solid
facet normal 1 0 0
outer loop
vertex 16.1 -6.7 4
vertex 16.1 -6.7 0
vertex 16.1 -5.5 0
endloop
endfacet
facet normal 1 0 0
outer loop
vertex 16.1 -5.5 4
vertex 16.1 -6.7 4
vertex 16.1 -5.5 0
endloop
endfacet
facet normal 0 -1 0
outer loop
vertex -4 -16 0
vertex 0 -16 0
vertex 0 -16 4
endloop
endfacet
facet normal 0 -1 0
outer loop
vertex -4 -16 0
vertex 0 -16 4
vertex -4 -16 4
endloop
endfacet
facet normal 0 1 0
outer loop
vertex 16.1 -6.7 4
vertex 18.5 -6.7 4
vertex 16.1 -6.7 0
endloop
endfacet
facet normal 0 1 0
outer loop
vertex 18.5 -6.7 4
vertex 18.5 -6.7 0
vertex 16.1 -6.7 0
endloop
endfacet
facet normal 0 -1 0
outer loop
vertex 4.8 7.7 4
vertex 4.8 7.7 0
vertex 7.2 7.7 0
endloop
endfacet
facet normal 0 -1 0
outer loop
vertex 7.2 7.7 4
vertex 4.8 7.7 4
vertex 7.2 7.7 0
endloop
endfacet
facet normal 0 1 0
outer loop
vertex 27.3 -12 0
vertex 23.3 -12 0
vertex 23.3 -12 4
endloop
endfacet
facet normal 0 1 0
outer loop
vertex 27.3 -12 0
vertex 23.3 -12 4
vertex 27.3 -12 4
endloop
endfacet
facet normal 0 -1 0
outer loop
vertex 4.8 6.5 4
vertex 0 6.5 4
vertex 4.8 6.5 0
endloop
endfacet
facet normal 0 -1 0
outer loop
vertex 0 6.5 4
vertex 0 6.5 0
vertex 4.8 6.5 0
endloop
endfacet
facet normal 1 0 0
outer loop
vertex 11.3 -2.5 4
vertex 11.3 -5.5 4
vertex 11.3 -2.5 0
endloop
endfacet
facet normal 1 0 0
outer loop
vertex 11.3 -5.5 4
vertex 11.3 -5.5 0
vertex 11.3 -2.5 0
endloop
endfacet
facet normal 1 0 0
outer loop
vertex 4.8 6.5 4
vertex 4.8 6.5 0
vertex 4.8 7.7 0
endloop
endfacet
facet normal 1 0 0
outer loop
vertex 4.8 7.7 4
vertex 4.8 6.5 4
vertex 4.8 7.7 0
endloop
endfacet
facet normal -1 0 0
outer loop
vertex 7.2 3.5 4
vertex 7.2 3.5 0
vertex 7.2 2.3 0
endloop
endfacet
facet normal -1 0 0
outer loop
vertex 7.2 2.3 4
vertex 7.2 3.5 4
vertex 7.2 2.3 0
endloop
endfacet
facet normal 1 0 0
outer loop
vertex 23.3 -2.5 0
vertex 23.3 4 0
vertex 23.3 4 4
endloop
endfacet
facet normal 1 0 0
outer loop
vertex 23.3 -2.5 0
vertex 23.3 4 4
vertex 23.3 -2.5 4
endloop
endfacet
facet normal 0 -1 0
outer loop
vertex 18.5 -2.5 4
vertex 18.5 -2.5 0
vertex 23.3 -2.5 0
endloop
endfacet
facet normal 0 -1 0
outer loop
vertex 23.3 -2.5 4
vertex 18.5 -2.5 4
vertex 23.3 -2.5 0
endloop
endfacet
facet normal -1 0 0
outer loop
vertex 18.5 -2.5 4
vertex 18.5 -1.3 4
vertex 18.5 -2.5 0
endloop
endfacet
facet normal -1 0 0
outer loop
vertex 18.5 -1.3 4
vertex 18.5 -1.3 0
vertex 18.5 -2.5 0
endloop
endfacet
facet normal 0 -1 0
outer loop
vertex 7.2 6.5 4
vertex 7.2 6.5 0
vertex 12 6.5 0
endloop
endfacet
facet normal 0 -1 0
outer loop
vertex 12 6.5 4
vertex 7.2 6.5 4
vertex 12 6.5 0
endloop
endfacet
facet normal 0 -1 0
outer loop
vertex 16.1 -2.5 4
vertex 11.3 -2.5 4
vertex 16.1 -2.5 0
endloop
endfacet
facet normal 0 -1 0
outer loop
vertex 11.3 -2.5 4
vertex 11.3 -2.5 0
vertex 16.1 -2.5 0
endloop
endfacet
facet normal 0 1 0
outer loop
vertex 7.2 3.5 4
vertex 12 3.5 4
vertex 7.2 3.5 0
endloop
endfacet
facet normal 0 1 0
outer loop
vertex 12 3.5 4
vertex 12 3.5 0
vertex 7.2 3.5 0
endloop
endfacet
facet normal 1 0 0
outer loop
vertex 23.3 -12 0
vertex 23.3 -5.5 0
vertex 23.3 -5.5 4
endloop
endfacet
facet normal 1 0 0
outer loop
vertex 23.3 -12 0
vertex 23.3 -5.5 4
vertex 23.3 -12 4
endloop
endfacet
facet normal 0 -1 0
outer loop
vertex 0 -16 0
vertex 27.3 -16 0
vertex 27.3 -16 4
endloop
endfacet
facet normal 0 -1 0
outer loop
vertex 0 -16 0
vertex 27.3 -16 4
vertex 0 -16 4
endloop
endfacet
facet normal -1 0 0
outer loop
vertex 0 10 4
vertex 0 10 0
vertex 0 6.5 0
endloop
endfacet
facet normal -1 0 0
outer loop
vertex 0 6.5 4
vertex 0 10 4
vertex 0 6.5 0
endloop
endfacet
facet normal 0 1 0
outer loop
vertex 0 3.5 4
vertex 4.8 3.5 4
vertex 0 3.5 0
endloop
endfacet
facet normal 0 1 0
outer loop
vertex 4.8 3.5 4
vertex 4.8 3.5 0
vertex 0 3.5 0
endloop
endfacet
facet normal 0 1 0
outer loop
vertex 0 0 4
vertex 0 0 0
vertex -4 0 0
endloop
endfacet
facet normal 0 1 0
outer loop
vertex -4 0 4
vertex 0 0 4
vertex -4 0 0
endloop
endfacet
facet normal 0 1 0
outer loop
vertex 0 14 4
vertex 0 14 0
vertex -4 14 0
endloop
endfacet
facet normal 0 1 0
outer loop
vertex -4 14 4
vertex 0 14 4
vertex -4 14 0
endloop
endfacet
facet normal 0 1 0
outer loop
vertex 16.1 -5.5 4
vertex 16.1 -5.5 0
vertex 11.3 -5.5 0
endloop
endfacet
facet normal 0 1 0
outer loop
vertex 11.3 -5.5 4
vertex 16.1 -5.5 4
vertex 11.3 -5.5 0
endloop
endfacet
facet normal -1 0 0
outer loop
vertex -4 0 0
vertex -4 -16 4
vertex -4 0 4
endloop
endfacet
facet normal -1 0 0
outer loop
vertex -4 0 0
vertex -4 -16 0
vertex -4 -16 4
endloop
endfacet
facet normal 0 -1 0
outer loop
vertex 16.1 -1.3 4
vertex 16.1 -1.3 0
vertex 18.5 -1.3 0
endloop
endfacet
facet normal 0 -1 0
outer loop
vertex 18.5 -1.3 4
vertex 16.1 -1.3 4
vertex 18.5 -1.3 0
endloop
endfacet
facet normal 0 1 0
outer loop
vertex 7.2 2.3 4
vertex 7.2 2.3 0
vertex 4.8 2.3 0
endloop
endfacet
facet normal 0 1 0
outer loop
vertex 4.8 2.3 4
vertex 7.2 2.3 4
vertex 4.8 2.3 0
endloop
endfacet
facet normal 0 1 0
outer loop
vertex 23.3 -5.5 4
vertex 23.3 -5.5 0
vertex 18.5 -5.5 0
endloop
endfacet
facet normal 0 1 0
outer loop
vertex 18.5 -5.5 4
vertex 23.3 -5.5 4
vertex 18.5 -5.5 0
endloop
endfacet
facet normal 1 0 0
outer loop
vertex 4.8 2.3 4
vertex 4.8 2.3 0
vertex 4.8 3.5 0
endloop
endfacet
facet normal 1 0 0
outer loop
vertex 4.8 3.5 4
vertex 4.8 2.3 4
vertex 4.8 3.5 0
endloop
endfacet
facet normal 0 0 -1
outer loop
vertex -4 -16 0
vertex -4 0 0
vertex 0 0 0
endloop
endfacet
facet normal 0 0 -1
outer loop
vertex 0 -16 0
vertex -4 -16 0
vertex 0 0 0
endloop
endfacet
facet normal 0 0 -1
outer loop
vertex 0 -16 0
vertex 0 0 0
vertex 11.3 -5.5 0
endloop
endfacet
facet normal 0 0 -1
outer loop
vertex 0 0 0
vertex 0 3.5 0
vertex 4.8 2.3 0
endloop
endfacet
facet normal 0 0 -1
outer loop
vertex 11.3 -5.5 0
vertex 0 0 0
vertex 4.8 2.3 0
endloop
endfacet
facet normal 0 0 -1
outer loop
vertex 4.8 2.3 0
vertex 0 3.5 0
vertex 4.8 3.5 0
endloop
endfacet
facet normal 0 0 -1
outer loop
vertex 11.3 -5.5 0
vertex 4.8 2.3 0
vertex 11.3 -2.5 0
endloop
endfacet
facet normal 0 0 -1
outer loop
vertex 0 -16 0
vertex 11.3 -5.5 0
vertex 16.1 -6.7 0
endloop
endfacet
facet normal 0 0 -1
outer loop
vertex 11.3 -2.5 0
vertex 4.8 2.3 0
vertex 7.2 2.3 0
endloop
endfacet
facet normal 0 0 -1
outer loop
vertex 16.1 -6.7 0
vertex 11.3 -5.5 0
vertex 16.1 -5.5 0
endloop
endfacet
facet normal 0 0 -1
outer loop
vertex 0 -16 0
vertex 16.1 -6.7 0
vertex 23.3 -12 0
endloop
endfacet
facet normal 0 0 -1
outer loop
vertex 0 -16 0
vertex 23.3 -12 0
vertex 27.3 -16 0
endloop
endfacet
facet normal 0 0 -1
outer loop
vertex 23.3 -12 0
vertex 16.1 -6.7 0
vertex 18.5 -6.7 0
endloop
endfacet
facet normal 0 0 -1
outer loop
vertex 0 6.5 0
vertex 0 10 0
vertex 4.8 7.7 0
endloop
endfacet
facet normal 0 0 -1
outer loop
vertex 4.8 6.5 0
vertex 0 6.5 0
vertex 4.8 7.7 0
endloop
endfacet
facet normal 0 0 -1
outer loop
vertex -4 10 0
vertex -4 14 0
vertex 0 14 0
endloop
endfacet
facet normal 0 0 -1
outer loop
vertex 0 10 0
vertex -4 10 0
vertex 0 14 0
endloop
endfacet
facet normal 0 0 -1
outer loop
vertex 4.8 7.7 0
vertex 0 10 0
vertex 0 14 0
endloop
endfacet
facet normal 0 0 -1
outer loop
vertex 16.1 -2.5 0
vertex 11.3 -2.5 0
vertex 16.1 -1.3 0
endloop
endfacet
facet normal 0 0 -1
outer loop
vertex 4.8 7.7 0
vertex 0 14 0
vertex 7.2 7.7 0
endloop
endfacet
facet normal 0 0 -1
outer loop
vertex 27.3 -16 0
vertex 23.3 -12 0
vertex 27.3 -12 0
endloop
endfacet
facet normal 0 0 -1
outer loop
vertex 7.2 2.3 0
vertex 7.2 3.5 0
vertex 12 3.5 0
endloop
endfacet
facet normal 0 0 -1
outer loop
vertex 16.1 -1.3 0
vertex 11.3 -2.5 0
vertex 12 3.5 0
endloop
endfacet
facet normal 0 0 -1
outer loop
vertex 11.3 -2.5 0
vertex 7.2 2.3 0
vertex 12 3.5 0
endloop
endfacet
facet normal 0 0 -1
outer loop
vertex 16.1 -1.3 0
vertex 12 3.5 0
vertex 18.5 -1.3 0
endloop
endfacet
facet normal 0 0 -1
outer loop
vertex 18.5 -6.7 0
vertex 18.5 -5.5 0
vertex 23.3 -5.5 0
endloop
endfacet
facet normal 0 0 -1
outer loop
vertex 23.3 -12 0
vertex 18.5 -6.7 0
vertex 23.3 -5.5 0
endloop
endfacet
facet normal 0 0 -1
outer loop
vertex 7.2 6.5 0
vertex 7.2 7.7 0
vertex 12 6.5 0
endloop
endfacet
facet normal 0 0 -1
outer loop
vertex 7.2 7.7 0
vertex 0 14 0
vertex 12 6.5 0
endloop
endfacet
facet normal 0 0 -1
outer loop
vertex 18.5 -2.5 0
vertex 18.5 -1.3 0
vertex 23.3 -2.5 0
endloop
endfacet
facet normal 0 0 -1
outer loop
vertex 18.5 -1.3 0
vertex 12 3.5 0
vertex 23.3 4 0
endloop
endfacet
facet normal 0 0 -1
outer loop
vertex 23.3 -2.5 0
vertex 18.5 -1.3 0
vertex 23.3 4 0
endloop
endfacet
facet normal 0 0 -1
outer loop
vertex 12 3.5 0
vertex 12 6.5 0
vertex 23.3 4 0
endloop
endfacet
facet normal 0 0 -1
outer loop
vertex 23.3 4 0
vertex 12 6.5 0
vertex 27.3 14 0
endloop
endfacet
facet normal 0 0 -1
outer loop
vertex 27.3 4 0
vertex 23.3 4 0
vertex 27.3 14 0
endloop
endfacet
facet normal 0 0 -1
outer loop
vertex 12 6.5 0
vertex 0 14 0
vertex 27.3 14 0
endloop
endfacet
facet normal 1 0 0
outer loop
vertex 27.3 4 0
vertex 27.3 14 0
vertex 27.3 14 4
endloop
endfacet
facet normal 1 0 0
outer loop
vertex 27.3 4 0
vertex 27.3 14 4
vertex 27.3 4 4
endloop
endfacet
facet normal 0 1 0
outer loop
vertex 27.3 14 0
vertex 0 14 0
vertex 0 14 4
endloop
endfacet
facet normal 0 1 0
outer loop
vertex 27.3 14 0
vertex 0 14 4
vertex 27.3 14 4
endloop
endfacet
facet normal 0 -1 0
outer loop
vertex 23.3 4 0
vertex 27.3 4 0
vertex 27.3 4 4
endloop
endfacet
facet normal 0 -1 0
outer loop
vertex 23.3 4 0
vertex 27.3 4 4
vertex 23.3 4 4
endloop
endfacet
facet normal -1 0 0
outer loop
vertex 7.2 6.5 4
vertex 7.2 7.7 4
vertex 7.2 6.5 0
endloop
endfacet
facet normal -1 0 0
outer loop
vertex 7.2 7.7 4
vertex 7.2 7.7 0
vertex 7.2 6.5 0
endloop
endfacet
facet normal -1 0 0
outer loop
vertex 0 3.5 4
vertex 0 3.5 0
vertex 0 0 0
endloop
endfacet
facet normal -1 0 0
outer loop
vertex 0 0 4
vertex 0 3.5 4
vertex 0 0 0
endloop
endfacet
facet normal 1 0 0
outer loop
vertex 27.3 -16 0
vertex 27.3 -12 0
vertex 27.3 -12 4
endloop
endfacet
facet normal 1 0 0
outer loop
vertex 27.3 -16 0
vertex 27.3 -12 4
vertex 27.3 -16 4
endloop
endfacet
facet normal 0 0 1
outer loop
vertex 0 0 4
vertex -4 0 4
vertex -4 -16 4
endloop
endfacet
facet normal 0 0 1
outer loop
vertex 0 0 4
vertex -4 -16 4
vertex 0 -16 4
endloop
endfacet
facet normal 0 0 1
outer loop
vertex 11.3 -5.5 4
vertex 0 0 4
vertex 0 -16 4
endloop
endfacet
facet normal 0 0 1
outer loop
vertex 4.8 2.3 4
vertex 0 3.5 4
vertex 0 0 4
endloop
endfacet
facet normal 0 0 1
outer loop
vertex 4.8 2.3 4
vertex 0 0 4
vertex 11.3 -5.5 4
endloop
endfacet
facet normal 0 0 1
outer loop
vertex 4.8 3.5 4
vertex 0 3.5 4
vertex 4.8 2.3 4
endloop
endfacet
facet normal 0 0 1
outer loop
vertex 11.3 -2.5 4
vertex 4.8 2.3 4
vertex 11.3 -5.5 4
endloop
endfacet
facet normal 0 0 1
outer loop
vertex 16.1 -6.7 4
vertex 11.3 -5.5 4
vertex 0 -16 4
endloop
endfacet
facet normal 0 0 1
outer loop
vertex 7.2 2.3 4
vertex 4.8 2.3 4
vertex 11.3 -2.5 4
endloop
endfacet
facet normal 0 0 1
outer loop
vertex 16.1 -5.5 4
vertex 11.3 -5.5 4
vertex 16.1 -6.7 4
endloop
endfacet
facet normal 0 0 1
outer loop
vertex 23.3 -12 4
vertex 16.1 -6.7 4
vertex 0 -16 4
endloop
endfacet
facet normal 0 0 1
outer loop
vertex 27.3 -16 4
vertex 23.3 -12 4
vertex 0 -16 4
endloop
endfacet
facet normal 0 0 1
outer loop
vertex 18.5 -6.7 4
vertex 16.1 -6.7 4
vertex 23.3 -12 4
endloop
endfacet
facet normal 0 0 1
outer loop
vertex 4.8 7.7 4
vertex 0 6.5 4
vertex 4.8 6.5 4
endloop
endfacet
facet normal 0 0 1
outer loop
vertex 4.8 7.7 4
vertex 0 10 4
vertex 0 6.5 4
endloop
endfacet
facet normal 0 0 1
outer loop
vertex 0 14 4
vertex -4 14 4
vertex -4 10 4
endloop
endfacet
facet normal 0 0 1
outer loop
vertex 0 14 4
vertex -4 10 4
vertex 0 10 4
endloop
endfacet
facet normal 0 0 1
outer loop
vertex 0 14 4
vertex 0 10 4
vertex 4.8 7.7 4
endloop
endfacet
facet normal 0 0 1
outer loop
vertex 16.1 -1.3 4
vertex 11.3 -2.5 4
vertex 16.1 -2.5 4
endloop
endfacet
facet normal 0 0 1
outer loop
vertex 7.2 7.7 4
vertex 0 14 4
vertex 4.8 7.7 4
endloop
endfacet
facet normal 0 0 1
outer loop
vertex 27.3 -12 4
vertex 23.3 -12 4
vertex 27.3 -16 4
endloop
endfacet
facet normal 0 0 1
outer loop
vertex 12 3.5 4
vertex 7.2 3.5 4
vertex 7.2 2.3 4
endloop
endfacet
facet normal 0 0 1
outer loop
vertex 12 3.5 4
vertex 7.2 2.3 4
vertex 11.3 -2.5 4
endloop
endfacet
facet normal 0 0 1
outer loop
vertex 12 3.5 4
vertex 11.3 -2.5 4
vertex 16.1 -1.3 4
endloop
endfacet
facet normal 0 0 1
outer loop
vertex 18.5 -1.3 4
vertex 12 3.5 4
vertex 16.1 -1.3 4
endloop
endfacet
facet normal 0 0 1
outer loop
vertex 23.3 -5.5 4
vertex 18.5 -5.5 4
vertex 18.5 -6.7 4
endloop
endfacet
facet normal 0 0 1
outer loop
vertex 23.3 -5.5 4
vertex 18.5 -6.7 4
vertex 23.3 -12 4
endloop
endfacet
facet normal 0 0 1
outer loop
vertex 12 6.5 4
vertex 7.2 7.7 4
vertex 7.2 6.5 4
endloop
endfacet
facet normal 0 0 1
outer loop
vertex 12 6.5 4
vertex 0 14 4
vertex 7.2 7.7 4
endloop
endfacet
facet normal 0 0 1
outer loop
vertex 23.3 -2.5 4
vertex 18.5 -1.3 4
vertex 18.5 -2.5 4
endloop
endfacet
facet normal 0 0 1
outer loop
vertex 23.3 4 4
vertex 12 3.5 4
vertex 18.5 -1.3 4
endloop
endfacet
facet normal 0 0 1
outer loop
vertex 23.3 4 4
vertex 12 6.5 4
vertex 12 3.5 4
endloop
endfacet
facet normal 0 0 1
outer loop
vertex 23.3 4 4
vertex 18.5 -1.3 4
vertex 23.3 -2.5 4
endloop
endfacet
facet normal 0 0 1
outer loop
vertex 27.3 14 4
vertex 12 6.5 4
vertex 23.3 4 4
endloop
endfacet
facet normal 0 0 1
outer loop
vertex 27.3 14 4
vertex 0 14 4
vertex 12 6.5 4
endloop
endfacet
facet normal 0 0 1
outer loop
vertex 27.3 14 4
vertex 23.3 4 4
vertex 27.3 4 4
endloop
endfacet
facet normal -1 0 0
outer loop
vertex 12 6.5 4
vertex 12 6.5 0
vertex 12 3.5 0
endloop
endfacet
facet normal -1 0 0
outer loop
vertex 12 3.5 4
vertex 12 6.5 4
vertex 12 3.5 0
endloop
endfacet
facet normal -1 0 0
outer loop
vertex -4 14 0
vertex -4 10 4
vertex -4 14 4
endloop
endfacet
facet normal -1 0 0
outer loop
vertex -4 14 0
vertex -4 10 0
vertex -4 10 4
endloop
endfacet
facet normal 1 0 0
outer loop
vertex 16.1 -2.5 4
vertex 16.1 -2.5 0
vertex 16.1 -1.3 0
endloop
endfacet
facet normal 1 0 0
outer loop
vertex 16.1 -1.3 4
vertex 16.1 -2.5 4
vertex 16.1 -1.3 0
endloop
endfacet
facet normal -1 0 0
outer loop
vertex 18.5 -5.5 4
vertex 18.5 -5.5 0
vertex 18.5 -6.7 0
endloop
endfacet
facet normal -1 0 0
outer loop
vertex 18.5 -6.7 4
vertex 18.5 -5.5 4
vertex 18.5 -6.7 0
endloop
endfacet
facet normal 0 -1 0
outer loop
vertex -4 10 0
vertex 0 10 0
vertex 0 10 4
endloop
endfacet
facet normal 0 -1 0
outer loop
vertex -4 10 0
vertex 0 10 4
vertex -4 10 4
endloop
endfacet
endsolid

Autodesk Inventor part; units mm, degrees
ref_plane "YZ Plane" through (0, 0, 0) normal (1, 0, 0) x (0, 1, 0)
ref_plane "XZ Plane" through (0, 0, 0) normal (0, 1, 0) x (-1, 0, 0)
ref_plane "XY Plane" through (0, 0, 0) normal (0, 0, 1) x (1, 0, 0)
sketch "Sketch1" plane through (0, 0, 0) normal (0, 0, 1) x (1, 0, 0)
  line L0 (-4, 10) -> (-4, 14) projected
  line L1 (0, 10) -> (-4, 10) projected
  line L2 (0, 14) -> (0, 10) construction
  line L3 (0, 14) -> (-4, 14) projected
  line L4 (-4, -16) -> (-4, 0) projected
  line L5 (0, -16) -> (-4, -16) projected
  line L6 (0, 0) -> (0, -16) construction
  line L7 (0, 0) -> (-4, 0) projected
  line L8 (0, 6.5) -> (0, 3.5) projected
  line L9 (0, 6.5) -> (12, 6.5)
  line L10 (12, 6.5) -> (12, 3.5)
  line L11 (12, 3.5) -> (0, 3.5)
  line L12 (0, 3.5) -> (0, 6.5)
  line L13 (0, 10) -> (0, 6.5)
  line L14 (0, 3.5) -> (0, 0)
  line L15 (4.8, 7.7) -> (7.2, 7.7)
  line L16 (7.2, 7.7) -> (7.2, 2.3)
  line L17 (7.2, 2.3) -> (4.8, 2.3)
  line L18 (4.8, 2.3) -> (4.8, 7.7)
  line L19 (11.3, -2.5) -> (23.3, -2.5)
  line L20 (23.3, -2.5) -> (23.3, -5.5)
  line L21 (23.3, -5.5) -> (11.3, -5.5)
  line L22 (11.3, -5.5) -> (11.3, -2.5)
  line L23 (16.1, -1.3) -> (18.5, -1.3)
  line L24 (18.5, -1.3) -> (18.5, -6.7)
  line L25 (18.5, -6.7) -> (16.1, -6.7)
  line L26 (16.1, -6.7) -> (16.1, -1.3)
  line L27 (0, 14) -> (27.3, 14)
  line L28 (27.3, 14) -> (27.3, 4)
  line L29 (27.3, 4) -> (23.3, 4)
  line L30 (23.3, 4) -> (23.3, -12)
  line L31 (23.3, -12) -> (27.3, -12)
  line L32 (27.3, -12) -> (27.3, -16)
  line L33 (27.3, -16) -> (0, -16)
  point P0 (7.2, 5)
  point P1 (12, 5)
  point P2 (6, 7.7)
  point P3 (6, 6.5)
  point P4 (16.1, -4)
  point P5 (11.3, -4)
  point P6 (17.3, -1.3)
  point P7 (17.3, -2.5)
  point P8 (23.3, -4)
  point P9 (23.3, -4)
  point P10 (4.8, 6.5)
  point P11 (7.2, 6.5)
  point P12 (7.2, 3.5)
  point P13 (4.8, 3.5)
  point P14 (18.5, -5.5)
  point P15 (16.1, -5.5)
  point P16 (16.1, -2.5)
  point P17 (18.5, -2.5)
  dimension "d0" = 12
  dimension "d1" = 3
  dimension "d2" = 5.4
  dimension "d3" = 2.4
  dimension "d4" = 12
  dimension "d5" = 3
  dimension "d6" = 2.4
  dimension "d7" = 5.4
  dimension "d8" = 4
  dimension "d10" = 10
  dimension "d11" = 23.3
  dimension "d12" = 4
extrude "Extrusion1" add sketch "Sketch1" along normal blind 4 contours L0 L3 L27 L28 L29 L30 L19 L24 L23 L26 L22 L21 L25 L31 L32 L33 L5 L4 L7 L14 L11 L18 L17 L16 L10 L9 L15 L13 L1
properties part number "Door_LimitSwitch_Holder_Side_1" material "MDF Medium Density Fiberboard"
